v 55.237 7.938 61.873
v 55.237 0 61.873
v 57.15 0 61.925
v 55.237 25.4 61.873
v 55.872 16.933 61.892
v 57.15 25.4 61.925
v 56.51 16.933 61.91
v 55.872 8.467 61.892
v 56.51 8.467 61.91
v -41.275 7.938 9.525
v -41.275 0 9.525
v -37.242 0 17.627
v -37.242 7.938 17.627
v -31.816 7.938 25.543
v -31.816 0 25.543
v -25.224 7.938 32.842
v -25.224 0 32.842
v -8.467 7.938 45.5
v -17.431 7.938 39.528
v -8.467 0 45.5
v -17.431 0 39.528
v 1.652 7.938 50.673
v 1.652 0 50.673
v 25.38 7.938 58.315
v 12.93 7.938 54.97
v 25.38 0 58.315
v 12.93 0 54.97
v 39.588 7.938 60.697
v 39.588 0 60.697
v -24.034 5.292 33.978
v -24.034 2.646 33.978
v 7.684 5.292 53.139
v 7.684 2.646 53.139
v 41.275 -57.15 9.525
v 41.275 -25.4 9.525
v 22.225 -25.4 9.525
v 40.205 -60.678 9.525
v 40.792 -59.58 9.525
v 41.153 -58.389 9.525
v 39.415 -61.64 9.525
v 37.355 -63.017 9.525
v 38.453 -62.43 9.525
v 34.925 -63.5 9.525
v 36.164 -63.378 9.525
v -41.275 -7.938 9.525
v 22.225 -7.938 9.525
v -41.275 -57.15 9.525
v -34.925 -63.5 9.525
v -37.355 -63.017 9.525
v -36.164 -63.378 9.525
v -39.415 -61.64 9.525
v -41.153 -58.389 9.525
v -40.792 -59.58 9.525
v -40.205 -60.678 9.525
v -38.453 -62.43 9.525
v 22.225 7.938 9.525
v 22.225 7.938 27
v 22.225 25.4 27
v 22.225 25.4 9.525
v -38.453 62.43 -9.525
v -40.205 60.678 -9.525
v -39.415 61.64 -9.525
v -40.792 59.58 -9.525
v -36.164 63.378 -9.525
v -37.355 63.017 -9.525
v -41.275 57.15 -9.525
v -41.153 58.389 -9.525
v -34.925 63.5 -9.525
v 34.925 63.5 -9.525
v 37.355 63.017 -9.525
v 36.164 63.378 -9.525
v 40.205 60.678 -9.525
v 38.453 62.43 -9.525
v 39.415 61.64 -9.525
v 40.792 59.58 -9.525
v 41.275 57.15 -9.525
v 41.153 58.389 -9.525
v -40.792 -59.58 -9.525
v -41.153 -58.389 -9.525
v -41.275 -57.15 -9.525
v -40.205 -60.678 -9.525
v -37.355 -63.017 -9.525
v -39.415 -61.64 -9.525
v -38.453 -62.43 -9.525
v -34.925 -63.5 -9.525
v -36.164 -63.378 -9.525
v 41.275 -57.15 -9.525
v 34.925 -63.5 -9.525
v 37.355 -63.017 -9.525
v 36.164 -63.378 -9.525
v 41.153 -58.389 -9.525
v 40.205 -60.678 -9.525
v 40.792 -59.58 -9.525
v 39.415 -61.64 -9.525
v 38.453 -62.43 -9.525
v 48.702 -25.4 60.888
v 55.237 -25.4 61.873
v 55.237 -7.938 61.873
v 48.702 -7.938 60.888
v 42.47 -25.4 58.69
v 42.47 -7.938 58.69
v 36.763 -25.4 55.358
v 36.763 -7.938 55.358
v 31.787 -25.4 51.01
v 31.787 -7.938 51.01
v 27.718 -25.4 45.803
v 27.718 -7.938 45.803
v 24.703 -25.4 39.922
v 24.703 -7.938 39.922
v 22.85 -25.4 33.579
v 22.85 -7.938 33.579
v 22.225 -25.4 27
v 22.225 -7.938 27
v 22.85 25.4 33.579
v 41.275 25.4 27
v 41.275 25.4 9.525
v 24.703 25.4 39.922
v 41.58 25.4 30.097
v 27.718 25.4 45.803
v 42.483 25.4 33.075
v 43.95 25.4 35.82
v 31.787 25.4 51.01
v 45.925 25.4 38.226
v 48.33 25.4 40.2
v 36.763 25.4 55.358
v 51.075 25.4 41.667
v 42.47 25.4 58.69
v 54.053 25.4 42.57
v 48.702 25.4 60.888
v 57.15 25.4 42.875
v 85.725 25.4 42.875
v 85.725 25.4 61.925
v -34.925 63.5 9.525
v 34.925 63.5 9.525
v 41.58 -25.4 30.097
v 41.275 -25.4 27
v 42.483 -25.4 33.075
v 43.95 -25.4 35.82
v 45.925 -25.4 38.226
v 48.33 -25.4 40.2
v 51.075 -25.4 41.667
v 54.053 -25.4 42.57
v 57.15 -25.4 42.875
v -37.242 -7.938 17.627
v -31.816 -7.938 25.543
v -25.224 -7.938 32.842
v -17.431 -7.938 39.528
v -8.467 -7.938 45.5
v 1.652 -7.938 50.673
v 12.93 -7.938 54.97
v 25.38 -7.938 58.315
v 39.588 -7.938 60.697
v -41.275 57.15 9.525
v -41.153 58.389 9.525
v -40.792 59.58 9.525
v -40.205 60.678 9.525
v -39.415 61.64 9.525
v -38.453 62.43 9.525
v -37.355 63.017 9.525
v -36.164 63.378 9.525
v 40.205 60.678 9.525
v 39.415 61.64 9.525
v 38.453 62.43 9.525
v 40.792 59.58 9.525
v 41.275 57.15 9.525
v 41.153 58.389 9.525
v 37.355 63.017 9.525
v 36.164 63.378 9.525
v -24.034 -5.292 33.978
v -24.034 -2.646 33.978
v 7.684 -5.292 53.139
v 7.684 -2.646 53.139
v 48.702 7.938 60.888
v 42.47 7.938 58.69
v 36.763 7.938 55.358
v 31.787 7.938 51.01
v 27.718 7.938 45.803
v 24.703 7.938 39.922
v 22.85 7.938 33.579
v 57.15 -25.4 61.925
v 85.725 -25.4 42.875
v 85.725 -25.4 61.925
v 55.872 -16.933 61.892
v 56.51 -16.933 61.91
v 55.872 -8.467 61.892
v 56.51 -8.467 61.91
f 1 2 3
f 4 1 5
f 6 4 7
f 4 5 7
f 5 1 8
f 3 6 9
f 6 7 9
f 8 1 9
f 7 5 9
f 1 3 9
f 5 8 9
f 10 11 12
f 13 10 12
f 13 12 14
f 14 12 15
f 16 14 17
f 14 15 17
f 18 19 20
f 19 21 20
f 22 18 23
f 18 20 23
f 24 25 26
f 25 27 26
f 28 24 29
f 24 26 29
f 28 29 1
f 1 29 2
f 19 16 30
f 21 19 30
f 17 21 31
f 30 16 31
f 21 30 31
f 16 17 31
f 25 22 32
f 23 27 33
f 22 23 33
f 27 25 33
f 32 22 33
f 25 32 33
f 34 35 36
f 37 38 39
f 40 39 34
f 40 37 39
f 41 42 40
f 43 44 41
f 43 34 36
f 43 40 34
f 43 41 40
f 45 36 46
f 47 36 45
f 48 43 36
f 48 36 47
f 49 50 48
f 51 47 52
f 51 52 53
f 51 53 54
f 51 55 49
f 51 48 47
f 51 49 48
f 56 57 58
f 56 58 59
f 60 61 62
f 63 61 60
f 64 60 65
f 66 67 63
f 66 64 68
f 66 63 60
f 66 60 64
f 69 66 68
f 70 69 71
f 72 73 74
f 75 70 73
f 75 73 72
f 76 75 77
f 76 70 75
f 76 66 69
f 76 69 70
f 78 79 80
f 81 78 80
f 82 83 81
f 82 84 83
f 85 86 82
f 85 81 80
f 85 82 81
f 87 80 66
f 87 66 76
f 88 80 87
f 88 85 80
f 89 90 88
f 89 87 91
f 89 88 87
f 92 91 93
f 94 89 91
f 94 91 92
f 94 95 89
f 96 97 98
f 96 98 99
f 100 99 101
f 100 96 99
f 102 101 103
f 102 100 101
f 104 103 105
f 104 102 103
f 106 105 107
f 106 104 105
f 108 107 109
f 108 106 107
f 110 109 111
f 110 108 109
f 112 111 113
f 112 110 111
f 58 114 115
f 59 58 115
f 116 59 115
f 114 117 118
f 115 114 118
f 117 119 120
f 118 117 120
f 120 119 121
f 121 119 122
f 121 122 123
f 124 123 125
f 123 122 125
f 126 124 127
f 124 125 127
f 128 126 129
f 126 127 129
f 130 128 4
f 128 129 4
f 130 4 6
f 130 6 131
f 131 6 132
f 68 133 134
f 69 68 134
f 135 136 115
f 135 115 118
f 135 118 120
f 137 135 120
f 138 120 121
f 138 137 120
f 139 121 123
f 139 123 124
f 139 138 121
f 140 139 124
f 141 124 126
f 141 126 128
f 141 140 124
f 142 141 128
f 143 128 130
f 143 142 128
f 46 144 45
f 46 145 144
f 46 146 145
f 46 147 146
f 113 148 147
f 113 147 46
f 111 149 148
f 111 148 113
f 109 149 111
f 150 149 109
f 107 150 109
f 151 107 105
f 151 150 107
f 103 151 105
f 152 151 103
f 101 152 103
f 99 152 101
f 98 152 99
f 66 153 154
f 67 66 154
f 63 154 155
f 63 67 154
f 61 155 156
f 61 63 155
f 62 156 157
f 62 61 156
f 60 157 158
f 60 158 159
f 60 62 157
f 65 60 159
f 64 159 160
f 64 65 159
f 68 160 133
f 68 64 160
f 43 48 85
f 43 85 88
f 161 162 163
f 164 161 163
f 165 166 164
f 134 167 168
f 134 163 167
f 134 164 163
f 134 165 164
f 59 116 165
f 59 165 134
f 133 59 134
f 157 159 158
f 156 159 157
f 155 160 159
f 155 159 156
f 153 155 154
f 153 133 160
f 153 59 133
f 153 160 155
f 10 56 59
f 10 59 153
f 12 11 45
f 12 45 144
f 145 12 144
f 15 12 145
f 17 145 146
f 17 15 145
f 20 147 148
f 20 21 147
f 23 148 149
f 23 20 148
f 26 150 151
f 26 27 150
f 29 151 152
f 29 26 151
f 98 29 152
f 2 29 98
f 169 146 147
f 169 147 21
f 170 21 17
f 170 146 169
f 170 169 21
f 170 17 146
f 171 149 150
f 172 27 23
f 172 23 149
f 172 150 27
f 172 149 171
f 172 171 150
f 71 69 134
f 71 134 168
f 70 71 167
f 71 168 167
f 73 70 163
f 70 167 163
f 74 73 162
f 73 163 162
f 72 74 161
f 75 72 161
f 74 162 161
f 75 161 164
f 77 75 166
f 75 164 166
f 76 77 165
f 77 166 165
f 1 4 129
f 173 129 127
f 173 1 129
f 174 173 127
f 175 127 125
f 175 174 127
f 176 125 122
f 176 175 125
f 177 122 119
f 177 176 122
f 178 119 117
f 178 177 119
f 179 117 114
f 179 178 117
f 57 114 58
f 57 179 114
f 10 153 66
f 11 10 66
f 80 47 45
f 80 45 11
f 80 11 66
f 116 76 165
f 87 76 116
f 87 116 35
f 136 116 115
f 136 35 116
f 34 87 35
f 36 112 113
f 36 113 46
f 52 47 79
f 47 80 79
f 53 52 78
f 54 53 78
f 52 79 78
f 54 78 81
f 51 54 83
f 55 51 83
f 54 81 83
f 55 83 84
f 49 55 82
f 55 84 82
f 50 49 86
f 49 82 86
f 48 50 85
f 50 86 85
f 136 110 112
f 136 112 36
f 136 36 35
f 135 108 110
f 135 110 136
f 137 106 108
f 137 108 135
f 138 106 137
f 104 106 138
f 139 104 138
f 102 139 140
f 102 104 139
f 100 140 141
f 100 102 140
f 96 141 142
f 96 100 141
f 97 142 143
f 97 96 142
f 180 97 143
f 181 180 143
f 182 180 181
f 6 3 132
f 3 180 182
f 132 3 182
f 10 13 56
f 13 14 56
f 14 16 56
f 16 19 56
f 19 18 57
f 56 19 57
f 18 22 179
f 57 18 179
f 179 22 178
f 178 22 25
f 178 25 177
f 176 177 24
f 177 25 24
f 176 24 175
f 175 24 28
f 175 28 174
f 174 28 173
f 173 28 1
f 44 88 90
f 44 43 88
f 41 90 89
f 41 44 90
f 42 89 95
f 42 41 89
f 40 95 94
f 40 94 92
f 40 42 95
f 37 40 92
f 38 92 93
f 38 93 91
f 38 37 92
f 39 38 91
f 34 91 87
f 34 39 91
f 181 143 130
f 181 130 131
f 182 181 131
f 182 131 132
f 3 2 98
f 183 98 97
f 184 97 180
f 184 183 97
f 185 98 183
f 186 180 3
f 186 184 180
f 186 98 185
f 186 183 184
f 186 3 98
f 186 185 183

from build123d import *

# Parameters (mm, degrees)
F1_DEPTH = 63.5
F2_DEPTH = 25.4
F0_W     = 25.4
F0_H     = 19.05
F3_DEPTH = 25.4
F4_DEPTH = 7.9375
F5_R     = 6.35


with BuildPart() as f1:
    # F0 (on Front) → F1 (new body, symmetric)
    with BuildSketch(Plane.XZ):
        Polygon((41.275, -9.525), (41.275, 9.525), (22.225, 9.525), (-41.275, 9.525), (-41.275, -9.525), align=None)
    extrude(amount=F1_DEPTH, both=True)

    # F0 (on Front) → F2 (join, symmetric)
    with BuildSketch(Plane.XZ):
        with BuildLine():
            Line((22.225, 9.525), (41.275, 9.525))
            Line((41.275, 9.525), (41.275, 27.0002))
            ThreePointArc((41.275, 27.0002), (45.9246798487, 38.2255201513), (57.15, 42.8752))
            Line((57.15, 42.8752), (60.325, 42.8752))
            Line((60.325, 42.8752), (60.325, 61.9252))
            Line((60.325, 61.9252), (57.15, 61.9252))
            add(Edge.make_bspline(
                [(55.2366570208, 61.872750002), (55.8711155645, 61.8932498519), (56.5088935827, 61.9107444376), (57.15, 61.9252)],
                knots=[110.2536827307, 110.2536827307, 110.2536827307, 110.2536827307, 111.5045361635, 111.5045361635, 111.5045361635, 111.5045361635], degree=3))
            ThreePointArc((55.2366570208, 61.872750002), (31.7868463263, 51.0099076352), (22.225, 27.0002))
            Line((22.225, 27.0002), (22.225, 9.525))
        make_face()
    extrude(amount=F2_DEPTH, both=True)

    # F0 (on Front) → F3 (join, symmetric)
    with BuildSketch(Plane.XZ):
        with Locations((73.025, 52.4002)):
            Rectangle(F0_W, F0_H)
    extrude(amount=F3_DEPTH, both=True)

    # F0 (on Front) → F4 (join, symmetric)
    with BuildSketch(Plane.XZ):
        with BuildLine():
            Line((-41.275, 9.525), (22.225, 9.525))
            Line((22.225, 9.525), (22.225, 27.0002))
            ThreePointArc((22.225, 27.0002), (31.7868463263, 51.0099076352), (55.2366570208, 61.872750002))
            add(Edge.make_bspline(
                [(-41.275, 9.525), (-30.8197184048, 34.9105826404), (-0.6862745856, 60.0658365111), (55.2366570208, 61.872750002)],
                knots=[0, 0, 0, 0, 110.2536827307, 110.2536827307, 110.2536827307, 110.2536827307], degree=3))
        make_face()
    extrude(amount=F4_DEPTH, both=True)

    # F5
    f5_edges = [f1.edges().sort_by_distance(p)[0] for p in [
        (-41.275, -63.5, 0),
        (41.275, -63.5, 0),
        (-41.275, 63.5, 0),
        (41.275, 63.5, 0),
    ]]
    fillet(f5_edges, radius=F5_R)


solid = f1.part
